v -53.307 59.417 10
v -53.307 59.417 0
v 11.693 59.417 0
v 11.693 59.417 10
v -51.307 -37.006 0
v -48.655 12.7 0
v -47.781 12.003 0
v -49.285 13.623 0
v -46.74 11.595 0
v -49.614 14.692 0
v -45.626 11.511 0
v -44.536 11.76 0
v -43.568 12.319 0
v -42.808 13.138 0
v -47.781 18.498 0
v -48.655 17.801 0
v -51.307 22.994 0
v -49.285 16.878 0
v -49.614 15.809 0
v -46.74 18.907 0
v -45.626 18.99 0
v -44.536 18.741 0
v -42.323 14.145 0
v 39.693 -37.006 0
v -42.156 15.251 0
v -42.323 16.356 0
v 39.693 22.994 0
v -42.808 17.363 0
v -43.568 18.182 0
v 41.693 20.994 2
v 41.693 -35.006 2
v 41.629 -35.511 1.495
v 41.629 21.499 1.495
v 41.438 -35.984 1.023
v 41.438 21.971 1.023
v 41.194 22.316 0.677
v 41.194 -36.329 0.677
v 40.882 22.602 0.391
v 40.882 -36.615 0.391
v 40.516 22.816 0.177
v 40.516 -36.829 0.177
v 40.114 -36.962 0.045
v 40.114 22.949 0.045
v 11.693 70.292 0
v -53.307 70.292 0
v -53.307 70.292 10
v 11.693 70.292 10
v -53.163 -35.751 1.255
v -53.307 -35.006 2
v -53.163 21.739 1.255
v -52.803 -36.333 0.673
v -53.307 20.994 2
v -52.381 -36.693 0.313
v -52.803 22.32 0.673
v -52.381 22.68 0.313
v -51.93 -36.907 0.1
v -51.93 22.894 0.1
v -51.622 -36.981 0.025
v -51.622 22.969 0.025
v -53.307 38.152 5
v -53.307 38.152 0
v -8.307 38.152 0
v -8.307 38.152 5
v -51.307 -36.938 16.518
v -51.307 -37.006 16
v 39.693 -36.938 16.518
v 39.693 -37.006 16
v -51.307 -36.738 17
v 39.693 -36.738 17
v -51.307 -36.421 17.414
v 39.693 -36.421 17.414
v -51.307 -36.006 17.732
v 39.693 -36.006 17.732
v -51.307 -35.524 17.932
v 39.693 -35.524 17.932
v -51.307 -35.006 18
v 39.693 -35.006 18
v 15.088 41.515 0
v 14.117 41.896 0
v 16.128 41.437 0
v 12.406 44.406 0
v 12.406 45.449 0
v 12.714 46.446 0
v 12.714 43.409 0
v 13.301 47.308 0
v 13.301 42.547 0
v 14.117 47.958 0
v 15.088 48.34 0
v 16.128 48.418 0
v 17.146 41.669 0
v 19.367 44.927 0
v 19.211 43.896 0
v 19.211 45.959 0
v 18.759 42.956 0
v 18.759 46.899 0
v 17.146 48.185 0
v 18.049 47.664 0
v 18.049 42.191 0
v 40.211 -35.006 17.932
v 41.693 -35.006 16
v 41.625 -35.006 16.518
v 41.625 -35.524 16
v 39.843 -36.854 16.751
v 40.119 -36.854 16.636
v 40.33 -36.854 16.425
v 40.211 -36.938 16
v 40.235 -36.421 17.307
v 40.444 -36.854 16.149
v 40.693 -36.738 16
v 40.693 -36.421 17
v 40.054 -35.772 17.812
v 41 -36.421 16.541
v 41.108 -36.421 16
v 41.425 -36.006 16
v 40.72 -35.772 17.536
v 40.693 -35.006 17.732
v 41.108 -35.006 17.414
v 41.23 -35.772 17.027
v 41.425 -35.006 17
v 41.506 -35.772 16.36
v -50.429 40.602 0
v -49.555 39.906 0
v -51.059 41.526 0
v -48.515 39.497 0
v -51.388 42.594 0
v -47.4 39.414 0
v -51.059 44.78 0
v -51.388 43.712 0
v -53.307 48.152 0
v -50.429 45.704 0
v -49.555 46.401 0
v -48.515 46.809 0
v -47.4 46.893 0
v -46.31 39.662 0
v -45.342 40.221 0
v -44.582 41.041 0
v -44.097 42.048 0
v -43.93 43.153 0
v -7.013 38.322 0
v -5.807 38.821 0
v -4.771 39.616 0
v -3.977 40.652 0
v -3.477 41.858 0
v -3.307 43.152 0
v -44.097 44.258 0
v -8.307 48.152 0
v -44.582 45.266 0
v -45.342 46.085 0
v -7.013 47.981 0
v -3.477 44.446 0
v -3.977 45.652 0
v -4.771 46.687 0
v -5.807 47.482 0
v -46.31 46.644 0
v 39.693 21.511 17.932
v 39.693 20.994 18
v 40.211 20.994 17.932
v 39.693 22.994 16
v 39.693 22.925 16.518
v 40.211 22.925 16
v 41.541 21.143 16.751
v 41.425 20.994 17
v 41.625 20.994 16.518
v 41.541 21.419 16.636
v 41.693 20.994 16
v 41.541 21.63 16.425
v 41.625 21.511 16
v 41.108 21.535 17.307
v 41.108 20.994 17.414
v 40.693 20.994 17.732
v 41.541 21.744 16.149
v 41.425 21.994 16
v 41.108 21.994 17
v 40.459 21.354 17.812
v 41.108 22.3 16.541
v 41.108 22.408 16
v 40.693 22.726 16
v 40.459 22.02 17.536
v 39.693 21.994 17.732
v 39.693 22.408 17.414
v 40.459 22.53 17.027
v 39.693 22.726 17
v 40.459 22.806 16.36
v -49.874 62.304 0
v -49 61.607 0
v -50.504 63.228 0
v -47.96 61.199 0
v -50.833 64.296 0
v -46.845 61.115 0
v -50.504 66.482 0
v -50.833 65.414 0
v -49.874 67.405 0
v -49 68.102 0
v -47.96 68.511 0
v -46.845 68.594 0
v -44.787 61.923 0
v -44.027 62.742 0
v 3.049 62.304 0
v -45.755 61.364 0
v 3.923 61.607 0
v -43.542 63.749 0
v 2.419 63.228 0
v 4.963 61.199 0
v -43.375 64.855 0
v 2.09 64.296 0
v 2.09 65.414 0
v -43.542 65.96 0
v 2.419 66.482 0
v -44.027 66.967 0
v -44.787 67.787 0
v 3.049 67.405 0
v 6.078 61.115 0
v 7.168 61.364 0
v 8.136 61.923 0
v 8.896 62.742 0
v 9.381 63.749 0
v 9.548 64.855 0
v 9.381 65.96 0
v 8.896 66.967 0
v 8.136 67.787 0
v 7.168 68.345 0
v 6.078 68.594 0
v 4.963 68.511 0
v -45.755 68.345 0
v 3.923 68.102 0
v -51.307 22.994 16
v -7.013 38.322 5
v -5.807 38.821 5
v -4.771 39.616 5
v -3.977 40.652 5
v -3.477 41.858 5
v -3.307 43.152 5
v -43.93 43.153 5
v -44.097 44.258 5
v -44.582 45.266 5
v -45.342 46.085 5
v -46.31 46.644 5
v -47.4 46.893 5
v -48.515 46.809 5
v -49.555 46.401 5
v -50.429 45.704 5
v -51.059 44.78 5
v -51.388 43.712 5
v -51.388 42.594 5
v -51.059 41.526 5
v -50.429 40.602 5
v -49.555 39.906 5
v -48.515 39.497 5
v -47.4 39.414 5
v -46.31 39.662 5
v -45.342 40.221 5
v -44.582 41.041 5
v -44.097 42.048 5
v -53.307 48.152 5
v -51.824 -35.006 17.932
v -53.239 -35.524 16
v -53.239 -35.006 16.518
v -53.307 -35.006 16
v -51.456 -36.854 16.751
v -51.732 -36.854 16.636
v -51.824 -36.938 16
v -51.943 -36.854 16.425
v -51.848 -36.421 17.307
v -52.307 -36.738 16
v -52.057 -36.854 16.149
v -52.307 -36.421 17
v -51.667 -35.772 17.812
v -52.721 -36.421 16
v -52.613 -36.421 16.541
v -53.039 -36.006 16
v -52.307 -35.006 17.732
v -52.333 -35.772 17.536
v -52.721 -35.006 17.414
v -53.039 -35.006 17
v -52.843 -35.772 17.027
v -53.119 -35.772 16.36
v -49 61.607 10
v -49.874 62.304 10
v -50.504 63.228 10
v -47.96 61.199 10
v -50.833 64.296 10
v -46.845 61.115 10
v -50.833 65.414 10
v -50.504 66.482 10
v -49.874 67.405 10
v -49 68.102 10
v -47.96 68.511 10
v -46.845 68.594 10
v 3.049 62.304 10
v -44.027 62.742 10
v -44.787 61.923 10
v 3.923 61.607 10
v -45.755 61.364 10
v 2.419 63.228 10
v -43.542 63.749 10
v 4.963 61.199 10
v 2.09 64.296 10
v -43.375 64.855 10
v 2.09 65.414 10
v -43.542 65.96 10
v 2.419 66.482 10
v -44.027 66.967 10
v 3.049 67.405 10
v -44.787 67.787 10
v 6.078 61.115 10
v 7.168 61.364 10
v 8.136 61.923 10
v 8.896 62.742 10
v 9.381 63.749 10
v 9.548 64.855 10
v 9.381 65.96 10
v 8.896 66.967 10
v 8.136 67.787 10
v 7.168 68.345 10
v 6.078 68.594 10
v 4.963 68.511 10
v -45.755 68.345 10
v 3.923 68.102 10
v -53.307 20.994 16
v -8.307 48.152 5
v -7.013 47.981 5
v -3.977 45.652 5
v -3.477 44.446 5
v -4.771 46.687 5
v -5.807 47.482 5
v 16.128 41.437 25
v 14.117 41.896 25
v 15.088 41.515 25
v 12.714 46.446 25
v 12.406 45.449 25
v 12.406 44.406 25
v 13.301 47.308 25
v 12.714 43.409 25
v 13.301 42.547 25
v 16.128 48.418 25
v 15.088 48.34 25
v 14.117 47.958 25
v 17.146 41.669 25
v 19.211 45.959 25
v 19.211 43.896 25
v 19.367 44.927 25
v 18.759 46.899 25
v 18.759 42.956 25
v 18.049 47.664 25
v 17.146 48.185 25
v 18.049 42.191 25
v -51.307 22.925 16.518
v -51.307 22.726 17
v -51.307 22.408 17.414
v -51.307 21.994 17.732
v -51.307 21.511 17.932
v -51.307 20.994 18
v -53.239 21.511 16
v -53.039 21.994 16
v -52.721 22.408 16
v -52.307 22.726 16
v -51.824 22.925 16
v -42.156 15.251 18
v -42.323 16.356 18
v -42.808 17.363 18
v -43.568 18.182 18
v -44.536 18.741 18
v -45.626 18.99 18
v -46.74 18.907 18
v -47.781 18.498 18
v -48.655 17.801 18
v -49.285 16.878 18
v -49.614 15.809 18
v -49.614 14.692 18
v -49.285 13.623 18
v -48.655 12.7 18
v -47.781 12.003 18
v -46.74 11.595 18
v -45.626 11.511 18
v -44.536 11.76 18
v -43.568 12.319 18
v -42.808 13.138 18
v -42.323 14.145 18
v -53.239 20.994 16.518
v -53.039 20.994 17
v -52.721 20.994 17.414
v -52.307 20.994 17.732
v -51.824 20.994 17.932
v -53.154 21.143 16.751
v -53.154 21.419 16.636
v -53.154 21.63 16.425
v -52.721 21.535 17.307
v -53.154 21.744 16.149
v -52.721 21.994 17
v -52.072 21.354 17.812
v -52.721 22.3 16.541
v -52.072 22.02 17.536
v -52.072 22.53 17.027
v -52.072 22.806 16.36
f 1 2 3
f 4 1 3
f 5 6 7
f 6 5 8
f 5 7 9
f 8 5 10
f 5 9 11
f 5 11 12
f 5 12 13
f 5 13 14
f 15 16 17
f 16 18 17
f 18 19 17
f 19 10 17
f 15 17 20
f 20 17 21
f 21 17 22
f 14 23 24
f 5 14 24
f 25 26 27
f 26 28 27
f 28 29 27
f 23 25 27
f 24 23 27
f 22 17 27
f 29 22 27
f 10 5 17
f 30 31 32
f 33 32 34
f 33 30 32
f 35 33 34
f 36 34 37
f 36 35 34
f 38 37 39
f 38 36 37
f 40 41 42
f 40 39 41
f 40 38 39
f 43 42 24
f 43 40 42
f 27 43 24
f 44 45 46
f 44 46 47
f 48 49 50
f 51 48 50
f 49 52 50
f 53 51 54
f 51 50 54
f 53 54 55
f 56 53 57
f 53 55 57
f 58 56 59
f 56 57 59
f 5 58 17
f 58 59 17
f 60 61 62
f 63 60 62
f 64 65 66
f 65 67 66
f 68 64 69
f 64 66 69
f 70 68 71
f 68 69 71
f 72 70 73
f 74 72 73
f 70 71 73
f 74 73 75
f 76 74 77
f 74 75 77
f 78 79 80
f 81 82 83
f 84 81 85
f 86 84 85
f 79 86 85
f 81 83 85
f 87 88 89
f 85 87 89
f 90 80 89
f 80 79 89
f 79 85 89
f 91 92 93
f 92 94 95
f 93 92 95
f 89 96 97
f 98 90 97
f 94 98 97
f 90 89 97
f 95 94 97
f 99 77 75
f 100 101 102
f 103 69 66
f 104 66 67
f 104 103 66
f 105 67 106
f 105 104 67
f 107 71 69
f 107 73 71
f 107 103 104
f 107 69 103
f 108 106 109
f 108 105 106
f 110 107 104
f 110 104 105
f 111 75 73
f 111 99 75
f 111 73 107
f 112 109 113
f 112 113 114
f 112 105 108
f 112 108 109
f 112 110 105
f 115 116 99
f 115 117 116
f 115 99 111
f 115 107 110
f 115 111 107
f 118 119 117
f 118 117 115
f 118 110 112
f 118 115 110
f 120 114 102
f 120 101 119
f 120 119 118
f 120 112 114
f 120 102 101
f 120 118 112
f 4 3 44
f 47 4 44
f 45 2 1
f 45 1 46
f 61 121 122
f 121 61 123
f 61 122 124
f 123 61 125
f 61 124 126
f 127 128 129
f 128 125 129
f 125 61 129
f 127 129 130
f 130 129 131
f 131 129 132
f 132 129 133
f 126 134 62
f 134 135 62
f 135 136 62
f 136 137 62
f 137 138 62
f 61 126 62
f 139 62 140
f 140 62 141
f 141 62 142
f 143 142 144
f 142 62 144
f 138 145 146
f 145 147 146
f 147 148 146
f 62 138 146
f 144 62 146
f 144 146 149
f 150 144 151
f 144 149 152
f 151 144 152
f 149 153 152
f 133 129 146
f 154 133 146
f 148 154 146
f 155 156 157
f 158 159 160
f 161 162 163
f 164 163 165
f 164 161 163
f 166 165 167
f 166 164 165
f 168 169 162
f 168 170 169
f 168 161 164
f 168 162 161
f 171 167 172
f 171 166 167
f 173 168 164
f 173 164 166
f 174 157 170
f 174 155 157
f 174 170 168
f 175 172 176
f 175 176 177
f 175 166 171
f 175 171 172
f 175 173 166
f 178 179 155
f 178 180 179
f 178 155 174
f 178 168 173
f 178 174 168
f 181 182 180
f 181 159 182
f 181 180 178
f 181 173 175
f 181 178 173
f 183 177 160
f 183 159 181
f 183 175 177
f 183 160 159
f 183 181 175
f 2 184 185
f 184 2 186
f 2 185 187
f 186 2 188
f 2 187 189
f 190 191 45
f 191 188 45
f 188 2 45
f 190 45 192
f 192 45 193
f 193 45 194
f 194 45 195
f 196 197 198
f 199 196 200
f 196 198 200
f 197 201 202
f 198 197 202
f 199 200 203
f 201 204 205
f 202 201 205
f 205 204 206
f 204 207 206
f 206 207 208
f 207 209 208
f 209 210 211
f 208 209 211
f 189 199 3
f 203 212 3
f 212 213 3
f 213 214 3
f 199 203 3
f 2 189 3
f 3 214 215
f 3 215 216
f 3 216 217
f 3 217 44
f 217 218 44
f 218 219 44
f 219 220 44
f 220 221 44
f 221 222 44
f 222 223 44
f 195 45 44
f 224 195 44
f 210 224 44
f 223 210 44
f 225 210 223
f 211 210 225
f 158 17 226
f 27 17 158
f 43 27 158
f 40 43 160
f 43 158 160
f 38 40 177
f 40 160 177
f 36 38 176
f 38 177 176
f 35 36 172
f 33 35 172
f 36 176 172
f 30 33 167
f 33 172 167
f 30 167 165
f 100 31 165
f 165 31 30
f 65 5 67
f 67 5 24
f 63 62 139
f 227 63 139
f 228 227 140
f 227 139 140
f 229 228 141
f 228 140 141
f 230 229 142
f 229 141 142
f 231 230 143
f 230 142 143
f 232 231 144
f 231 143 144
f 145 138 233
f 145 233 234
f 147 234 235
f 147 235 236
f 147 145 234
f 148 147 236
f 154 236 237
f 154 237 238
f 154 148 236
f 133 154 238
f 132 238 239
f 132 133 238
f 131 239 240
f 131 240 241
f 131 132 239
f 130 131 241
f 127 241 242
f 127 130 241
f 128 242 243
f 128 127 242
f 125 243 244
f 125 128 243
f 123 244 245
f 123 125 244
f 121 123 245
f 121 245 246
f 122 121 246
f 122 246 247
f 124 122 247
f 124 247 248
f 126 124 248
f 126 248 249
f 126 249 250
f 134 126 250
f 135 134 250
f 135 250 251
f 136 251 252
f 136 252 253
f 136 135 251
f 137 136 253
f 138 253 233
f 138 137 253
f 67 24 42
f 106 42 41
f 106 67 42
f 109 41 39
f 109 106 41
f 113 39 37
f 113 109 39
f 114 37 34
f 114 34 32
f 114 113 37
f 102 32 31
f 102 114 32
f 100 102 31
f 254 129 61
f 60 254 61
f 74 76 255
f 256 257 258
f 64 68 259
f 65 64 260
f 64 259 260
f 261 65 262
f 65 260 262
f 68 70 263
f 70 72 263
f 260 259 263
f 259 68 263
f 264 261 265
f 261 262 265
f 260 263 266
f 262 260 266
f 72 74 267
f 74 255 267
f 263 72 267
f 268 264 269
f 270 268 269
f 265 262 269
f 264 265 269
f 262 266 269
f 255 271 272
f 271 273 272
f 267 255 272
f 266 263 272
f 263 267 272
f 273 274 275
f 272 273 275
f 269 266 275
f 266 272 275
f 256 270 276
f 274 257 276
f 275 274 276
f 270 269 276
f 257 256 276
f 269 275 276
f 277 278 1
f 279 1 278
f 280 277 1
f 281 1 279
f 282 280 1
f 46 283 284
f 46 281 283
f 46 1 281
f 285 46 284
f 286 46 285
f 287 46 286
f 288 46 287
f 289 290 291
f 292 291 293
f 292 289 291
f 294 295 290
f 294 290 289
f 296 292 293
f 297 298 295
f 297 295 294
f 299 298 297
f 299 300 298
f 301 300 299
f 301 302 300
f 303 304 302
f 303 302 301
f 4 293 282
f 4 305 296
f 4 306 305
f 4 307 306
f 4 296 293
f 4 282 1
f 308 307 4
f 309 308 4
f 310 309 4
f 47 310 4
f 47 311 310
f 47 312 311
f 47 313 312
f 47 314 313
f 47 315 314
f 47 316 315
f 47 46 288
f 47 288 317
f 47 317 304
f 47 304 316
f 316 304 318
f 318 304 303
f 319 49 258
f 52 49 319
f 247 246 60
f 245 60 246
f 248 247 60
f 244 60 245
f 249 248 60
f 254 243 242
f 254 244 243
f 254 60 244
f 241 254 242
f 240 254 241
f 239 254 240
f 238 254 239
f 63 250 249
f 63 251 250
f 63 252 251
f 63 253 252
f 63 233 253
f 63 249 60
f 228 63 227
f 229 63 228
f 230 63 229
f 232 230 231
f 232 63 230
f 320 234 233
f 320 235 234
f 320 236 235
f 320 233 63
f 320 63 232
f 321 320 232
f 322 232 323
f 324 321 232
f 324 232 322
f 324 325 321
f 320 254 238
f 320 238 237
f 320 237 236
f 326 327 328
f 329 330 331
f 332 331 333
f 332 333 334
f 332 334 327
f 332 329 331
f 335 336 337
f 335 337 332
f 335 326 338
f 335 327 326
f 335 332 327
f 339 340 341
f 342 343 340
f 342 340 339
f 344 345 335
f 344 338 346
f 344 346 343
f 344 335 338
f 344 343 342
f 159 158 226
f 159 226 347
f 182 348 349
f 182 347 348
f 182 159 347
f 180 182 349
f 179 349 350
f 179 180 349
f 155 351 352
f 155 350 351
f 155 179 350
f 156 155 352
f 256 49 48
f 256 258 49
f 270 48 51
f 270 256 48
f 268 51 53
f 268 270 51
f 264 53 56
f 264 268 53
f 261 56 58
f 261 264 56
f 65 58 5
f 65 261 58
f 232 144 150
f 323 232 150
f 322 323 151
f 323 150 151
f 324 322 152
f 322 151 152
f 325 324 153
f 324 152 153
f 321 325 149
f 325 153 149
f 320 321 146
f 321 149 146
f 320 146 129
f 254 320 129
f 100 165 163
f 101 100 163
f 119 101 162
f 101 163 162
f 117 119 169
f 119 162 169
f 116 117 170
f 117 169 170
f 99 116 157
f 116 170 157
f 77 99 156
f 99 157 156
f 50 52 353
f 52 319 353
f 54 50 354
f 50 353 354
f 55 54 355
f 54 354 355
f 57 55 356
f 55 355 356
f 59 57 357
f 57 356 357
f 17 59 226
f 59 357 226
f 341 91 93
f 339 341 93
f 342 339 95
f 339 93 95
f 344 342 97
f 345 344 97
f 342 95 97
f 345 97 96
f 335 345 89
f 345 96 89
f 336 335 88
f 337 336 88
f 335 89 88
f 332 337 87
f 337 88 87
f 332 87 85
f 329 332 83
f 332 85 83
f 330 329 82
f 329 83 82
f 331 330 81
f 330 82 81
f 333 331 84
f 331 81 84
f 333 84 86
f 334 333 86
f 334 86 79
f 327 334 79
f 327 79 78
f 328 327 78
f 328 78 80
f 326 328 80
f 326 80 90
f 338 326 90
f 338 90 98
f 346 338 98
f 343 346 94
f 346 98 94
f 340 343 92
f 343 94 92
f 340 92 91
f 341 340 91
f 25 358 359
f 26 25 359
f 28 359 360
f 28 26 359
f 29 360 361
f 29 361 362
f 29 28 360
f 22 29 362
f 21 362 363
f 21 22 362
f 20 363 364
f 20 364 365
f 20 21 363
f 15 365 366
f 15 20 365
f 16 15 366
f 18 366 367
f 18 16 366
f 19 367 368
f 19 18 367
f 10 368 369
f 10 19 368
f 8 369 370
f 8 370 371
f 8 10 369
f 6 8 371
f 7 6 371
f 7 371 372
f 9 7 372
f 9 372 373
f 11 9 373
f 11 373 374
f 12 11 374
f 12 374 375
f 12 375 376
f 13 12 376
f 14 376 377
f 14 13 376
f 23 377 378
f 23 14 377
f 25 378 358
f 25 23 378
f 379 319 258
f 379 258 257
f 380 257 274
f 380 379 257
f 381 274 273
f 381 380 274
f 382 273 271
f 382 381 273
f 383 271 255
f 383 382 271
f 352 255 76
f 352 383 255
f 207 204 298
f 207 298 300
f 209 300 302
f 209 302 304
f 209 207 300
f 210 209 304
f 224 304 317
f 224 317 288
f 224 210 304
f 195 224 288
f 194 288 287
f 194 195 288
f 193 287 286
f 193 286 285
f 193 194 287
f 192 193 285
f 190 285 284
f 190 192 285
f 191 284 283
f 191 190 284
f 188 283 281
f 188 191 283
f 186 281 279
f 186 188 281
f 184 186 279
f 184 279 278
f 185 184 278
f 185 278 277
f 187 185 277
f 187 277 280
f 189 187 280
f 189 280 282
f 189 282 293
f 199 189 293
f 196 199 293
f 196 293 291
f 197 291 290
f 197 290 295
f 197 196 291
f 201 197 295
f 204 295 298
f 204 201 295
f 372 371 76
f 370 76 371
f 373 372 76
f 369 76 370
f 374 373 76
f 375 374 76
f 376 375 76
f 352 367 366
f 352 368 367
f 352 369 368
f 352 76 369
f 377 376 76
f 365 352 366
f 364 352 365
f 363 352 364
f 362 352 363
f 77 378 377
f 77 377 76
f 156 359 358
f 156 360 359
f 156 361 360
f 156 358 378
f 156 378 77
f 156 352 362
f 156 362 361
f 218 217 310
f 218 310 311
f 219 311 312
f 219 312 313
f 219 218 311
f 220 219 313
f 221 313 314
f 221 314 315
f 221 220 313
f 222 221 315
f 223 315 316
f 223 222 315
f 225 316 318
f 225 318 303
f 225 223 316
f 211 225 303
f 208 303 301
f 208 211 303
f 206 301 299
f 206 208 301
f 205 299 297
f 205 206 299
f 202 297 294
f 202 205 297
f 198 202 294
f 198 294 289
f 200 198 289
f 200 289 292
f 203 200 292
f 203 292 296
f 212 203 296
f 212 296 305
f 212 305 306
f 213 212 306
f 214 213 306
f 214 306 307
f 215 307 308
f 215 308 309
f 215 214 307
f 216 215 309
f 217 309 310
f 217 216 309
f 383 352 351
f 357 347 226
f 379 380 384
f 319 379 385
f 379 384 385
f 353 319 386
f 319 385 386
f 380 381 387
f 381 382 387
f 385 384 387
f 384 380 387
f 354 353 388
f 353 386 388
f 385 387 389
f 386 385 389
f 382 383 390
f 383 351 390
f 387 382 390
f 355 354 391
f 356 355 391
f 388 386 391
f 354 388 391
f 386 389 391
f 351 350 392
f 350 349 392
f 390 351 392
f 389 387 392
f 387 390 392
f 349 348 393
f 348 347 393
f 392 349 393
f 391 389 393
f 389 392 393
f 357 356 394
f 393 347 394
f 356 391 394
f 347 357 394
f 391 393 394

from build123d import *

# Parameters (mm, degrees)
F0_R     = 3.75
F1_DEPTH = 5
F0_W     = 95
F0_H     = 60
F2_DEPTH = 18
F0_R_2   = 3.5
F3_DEPTH = 25
F4_R     = 2
F0_W_2   = 65
F0_H_2   = 10.874569
F5_DEPTH = 10


with BuildPart() as f1:
    # F0 (on Top) → F1 (new body)
    with BuildSketch(Plane.XY):
        with BuildLine():
            Line((-8.306668, 48.151611), (-53.306668, 48.151611))
            Line((-53.306668, 48.151611), (-53.306668, 38.151611))
            Line((-53.306668, 38.151611), (-8.306668, 38.151611))
            ThreePointArc((-8.306668, 38.151611), (-4.771134, 39.616077), (-3.306668, 43.151611))
            ThreePointArc((-3.306668, 43.151611), (-4.771134, 46.687145), (-8.306668, 48.151611))
        make_face()
        with Locations((-47.680058, 43.153137)):
            Circle(F0_R, mode=Mode.SUBTRACT)
    extrude(amount=F1_DEPTH)


with BuildPart() as f2:
    # F0 (on Top) → F2 (new body)
    with BuildSketch(Plane.XY):
        with Locations((-5.806668, -7.006378)):
            Rectangle(F0_W, F0_H)
        with Locations((-45.905903, 15.250529)):
            Circle(F0_R, mode=Mode.SUBTRACT)
    extrude(amount=F2_DEPTH)

    # F4
    f4_edges = [f2.edges().sort_by_distance(p)[0] for p in [
        (-5.806668, 22.993622, 18),
        (-53.306668, -7.006378, 18),
        (41.693332, -7.006378, 18),
        (-5.806668, -37.006378, 18),
        (-53.306668, 22.993622, 9),
        (-53.306668, -37.006378, 9),
        (-53.306668, -7.006378, 0),
        (41.693332, -37.006378, 9),
        (41.693332, 22.993622, 9),
        (41.693332, -7.006378, 0),
    ]]
    fillet(f4_edges, radius=F4_R)


with BuildPart() as f3:
    # F0 (on Top) → F3 (new body)
    with BuildSketch(Plane.XY):
        with Locations((15.866924, 44.927292)):
            Circle(F0_R_2)
    extrude(amount=F3_DEPTH)


with BuildPart() as f5:
    # F0 (on Top) → F5 (new body)
    with BuildSketch(Plane.XY):
        with Locations((-20.806668, 64.854718)):
            Rectangle(F0_W_2, F0_H_2)
        with Locations((-47.12528, 64.854719)):
            Circle(F0_R, mode=Mode.SUBTRACT)
        with Locations((5.797623, 64.854719)):
            Circle(F0_R, mode=Mode.SUBTRACT)
    extrude(amount=F5_DEPTH)


solid = Compound([f1.part, f2.part, f3.part, f5.part])
